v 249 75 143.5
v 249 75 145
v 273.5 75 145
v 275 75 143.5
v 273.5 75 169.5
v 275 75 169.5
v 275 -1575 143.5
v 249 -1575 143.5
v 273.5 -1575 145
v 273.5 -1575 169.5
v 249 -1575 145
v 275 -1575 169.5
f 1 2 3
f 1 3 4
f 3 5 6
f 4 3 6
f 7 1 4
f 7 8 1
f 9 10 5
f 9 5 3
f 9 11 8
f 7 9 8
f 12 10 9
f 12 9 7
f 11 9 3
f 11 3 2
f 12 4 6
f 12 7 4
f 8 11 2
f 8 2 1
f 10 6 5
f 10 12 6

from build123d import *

# Parameters (mm, degrees)
BOSS_EXTRUDE1_DEPTH = 825


with BuildPart() as part:
    # Sketch2 → Boss-Extrude1 (new, symmetric)
    with BuildSketch(Plane.XZ.offset(750)):
        Polygon((275, 169.5), (273.5, 169.5), (273.5, 145), (249, 145), (249, 143.5), (275, 143.5), align=None)
    extrude(amount=BOSS_EXTRUDE1_DEPTH, both=True)


solid = part.part
